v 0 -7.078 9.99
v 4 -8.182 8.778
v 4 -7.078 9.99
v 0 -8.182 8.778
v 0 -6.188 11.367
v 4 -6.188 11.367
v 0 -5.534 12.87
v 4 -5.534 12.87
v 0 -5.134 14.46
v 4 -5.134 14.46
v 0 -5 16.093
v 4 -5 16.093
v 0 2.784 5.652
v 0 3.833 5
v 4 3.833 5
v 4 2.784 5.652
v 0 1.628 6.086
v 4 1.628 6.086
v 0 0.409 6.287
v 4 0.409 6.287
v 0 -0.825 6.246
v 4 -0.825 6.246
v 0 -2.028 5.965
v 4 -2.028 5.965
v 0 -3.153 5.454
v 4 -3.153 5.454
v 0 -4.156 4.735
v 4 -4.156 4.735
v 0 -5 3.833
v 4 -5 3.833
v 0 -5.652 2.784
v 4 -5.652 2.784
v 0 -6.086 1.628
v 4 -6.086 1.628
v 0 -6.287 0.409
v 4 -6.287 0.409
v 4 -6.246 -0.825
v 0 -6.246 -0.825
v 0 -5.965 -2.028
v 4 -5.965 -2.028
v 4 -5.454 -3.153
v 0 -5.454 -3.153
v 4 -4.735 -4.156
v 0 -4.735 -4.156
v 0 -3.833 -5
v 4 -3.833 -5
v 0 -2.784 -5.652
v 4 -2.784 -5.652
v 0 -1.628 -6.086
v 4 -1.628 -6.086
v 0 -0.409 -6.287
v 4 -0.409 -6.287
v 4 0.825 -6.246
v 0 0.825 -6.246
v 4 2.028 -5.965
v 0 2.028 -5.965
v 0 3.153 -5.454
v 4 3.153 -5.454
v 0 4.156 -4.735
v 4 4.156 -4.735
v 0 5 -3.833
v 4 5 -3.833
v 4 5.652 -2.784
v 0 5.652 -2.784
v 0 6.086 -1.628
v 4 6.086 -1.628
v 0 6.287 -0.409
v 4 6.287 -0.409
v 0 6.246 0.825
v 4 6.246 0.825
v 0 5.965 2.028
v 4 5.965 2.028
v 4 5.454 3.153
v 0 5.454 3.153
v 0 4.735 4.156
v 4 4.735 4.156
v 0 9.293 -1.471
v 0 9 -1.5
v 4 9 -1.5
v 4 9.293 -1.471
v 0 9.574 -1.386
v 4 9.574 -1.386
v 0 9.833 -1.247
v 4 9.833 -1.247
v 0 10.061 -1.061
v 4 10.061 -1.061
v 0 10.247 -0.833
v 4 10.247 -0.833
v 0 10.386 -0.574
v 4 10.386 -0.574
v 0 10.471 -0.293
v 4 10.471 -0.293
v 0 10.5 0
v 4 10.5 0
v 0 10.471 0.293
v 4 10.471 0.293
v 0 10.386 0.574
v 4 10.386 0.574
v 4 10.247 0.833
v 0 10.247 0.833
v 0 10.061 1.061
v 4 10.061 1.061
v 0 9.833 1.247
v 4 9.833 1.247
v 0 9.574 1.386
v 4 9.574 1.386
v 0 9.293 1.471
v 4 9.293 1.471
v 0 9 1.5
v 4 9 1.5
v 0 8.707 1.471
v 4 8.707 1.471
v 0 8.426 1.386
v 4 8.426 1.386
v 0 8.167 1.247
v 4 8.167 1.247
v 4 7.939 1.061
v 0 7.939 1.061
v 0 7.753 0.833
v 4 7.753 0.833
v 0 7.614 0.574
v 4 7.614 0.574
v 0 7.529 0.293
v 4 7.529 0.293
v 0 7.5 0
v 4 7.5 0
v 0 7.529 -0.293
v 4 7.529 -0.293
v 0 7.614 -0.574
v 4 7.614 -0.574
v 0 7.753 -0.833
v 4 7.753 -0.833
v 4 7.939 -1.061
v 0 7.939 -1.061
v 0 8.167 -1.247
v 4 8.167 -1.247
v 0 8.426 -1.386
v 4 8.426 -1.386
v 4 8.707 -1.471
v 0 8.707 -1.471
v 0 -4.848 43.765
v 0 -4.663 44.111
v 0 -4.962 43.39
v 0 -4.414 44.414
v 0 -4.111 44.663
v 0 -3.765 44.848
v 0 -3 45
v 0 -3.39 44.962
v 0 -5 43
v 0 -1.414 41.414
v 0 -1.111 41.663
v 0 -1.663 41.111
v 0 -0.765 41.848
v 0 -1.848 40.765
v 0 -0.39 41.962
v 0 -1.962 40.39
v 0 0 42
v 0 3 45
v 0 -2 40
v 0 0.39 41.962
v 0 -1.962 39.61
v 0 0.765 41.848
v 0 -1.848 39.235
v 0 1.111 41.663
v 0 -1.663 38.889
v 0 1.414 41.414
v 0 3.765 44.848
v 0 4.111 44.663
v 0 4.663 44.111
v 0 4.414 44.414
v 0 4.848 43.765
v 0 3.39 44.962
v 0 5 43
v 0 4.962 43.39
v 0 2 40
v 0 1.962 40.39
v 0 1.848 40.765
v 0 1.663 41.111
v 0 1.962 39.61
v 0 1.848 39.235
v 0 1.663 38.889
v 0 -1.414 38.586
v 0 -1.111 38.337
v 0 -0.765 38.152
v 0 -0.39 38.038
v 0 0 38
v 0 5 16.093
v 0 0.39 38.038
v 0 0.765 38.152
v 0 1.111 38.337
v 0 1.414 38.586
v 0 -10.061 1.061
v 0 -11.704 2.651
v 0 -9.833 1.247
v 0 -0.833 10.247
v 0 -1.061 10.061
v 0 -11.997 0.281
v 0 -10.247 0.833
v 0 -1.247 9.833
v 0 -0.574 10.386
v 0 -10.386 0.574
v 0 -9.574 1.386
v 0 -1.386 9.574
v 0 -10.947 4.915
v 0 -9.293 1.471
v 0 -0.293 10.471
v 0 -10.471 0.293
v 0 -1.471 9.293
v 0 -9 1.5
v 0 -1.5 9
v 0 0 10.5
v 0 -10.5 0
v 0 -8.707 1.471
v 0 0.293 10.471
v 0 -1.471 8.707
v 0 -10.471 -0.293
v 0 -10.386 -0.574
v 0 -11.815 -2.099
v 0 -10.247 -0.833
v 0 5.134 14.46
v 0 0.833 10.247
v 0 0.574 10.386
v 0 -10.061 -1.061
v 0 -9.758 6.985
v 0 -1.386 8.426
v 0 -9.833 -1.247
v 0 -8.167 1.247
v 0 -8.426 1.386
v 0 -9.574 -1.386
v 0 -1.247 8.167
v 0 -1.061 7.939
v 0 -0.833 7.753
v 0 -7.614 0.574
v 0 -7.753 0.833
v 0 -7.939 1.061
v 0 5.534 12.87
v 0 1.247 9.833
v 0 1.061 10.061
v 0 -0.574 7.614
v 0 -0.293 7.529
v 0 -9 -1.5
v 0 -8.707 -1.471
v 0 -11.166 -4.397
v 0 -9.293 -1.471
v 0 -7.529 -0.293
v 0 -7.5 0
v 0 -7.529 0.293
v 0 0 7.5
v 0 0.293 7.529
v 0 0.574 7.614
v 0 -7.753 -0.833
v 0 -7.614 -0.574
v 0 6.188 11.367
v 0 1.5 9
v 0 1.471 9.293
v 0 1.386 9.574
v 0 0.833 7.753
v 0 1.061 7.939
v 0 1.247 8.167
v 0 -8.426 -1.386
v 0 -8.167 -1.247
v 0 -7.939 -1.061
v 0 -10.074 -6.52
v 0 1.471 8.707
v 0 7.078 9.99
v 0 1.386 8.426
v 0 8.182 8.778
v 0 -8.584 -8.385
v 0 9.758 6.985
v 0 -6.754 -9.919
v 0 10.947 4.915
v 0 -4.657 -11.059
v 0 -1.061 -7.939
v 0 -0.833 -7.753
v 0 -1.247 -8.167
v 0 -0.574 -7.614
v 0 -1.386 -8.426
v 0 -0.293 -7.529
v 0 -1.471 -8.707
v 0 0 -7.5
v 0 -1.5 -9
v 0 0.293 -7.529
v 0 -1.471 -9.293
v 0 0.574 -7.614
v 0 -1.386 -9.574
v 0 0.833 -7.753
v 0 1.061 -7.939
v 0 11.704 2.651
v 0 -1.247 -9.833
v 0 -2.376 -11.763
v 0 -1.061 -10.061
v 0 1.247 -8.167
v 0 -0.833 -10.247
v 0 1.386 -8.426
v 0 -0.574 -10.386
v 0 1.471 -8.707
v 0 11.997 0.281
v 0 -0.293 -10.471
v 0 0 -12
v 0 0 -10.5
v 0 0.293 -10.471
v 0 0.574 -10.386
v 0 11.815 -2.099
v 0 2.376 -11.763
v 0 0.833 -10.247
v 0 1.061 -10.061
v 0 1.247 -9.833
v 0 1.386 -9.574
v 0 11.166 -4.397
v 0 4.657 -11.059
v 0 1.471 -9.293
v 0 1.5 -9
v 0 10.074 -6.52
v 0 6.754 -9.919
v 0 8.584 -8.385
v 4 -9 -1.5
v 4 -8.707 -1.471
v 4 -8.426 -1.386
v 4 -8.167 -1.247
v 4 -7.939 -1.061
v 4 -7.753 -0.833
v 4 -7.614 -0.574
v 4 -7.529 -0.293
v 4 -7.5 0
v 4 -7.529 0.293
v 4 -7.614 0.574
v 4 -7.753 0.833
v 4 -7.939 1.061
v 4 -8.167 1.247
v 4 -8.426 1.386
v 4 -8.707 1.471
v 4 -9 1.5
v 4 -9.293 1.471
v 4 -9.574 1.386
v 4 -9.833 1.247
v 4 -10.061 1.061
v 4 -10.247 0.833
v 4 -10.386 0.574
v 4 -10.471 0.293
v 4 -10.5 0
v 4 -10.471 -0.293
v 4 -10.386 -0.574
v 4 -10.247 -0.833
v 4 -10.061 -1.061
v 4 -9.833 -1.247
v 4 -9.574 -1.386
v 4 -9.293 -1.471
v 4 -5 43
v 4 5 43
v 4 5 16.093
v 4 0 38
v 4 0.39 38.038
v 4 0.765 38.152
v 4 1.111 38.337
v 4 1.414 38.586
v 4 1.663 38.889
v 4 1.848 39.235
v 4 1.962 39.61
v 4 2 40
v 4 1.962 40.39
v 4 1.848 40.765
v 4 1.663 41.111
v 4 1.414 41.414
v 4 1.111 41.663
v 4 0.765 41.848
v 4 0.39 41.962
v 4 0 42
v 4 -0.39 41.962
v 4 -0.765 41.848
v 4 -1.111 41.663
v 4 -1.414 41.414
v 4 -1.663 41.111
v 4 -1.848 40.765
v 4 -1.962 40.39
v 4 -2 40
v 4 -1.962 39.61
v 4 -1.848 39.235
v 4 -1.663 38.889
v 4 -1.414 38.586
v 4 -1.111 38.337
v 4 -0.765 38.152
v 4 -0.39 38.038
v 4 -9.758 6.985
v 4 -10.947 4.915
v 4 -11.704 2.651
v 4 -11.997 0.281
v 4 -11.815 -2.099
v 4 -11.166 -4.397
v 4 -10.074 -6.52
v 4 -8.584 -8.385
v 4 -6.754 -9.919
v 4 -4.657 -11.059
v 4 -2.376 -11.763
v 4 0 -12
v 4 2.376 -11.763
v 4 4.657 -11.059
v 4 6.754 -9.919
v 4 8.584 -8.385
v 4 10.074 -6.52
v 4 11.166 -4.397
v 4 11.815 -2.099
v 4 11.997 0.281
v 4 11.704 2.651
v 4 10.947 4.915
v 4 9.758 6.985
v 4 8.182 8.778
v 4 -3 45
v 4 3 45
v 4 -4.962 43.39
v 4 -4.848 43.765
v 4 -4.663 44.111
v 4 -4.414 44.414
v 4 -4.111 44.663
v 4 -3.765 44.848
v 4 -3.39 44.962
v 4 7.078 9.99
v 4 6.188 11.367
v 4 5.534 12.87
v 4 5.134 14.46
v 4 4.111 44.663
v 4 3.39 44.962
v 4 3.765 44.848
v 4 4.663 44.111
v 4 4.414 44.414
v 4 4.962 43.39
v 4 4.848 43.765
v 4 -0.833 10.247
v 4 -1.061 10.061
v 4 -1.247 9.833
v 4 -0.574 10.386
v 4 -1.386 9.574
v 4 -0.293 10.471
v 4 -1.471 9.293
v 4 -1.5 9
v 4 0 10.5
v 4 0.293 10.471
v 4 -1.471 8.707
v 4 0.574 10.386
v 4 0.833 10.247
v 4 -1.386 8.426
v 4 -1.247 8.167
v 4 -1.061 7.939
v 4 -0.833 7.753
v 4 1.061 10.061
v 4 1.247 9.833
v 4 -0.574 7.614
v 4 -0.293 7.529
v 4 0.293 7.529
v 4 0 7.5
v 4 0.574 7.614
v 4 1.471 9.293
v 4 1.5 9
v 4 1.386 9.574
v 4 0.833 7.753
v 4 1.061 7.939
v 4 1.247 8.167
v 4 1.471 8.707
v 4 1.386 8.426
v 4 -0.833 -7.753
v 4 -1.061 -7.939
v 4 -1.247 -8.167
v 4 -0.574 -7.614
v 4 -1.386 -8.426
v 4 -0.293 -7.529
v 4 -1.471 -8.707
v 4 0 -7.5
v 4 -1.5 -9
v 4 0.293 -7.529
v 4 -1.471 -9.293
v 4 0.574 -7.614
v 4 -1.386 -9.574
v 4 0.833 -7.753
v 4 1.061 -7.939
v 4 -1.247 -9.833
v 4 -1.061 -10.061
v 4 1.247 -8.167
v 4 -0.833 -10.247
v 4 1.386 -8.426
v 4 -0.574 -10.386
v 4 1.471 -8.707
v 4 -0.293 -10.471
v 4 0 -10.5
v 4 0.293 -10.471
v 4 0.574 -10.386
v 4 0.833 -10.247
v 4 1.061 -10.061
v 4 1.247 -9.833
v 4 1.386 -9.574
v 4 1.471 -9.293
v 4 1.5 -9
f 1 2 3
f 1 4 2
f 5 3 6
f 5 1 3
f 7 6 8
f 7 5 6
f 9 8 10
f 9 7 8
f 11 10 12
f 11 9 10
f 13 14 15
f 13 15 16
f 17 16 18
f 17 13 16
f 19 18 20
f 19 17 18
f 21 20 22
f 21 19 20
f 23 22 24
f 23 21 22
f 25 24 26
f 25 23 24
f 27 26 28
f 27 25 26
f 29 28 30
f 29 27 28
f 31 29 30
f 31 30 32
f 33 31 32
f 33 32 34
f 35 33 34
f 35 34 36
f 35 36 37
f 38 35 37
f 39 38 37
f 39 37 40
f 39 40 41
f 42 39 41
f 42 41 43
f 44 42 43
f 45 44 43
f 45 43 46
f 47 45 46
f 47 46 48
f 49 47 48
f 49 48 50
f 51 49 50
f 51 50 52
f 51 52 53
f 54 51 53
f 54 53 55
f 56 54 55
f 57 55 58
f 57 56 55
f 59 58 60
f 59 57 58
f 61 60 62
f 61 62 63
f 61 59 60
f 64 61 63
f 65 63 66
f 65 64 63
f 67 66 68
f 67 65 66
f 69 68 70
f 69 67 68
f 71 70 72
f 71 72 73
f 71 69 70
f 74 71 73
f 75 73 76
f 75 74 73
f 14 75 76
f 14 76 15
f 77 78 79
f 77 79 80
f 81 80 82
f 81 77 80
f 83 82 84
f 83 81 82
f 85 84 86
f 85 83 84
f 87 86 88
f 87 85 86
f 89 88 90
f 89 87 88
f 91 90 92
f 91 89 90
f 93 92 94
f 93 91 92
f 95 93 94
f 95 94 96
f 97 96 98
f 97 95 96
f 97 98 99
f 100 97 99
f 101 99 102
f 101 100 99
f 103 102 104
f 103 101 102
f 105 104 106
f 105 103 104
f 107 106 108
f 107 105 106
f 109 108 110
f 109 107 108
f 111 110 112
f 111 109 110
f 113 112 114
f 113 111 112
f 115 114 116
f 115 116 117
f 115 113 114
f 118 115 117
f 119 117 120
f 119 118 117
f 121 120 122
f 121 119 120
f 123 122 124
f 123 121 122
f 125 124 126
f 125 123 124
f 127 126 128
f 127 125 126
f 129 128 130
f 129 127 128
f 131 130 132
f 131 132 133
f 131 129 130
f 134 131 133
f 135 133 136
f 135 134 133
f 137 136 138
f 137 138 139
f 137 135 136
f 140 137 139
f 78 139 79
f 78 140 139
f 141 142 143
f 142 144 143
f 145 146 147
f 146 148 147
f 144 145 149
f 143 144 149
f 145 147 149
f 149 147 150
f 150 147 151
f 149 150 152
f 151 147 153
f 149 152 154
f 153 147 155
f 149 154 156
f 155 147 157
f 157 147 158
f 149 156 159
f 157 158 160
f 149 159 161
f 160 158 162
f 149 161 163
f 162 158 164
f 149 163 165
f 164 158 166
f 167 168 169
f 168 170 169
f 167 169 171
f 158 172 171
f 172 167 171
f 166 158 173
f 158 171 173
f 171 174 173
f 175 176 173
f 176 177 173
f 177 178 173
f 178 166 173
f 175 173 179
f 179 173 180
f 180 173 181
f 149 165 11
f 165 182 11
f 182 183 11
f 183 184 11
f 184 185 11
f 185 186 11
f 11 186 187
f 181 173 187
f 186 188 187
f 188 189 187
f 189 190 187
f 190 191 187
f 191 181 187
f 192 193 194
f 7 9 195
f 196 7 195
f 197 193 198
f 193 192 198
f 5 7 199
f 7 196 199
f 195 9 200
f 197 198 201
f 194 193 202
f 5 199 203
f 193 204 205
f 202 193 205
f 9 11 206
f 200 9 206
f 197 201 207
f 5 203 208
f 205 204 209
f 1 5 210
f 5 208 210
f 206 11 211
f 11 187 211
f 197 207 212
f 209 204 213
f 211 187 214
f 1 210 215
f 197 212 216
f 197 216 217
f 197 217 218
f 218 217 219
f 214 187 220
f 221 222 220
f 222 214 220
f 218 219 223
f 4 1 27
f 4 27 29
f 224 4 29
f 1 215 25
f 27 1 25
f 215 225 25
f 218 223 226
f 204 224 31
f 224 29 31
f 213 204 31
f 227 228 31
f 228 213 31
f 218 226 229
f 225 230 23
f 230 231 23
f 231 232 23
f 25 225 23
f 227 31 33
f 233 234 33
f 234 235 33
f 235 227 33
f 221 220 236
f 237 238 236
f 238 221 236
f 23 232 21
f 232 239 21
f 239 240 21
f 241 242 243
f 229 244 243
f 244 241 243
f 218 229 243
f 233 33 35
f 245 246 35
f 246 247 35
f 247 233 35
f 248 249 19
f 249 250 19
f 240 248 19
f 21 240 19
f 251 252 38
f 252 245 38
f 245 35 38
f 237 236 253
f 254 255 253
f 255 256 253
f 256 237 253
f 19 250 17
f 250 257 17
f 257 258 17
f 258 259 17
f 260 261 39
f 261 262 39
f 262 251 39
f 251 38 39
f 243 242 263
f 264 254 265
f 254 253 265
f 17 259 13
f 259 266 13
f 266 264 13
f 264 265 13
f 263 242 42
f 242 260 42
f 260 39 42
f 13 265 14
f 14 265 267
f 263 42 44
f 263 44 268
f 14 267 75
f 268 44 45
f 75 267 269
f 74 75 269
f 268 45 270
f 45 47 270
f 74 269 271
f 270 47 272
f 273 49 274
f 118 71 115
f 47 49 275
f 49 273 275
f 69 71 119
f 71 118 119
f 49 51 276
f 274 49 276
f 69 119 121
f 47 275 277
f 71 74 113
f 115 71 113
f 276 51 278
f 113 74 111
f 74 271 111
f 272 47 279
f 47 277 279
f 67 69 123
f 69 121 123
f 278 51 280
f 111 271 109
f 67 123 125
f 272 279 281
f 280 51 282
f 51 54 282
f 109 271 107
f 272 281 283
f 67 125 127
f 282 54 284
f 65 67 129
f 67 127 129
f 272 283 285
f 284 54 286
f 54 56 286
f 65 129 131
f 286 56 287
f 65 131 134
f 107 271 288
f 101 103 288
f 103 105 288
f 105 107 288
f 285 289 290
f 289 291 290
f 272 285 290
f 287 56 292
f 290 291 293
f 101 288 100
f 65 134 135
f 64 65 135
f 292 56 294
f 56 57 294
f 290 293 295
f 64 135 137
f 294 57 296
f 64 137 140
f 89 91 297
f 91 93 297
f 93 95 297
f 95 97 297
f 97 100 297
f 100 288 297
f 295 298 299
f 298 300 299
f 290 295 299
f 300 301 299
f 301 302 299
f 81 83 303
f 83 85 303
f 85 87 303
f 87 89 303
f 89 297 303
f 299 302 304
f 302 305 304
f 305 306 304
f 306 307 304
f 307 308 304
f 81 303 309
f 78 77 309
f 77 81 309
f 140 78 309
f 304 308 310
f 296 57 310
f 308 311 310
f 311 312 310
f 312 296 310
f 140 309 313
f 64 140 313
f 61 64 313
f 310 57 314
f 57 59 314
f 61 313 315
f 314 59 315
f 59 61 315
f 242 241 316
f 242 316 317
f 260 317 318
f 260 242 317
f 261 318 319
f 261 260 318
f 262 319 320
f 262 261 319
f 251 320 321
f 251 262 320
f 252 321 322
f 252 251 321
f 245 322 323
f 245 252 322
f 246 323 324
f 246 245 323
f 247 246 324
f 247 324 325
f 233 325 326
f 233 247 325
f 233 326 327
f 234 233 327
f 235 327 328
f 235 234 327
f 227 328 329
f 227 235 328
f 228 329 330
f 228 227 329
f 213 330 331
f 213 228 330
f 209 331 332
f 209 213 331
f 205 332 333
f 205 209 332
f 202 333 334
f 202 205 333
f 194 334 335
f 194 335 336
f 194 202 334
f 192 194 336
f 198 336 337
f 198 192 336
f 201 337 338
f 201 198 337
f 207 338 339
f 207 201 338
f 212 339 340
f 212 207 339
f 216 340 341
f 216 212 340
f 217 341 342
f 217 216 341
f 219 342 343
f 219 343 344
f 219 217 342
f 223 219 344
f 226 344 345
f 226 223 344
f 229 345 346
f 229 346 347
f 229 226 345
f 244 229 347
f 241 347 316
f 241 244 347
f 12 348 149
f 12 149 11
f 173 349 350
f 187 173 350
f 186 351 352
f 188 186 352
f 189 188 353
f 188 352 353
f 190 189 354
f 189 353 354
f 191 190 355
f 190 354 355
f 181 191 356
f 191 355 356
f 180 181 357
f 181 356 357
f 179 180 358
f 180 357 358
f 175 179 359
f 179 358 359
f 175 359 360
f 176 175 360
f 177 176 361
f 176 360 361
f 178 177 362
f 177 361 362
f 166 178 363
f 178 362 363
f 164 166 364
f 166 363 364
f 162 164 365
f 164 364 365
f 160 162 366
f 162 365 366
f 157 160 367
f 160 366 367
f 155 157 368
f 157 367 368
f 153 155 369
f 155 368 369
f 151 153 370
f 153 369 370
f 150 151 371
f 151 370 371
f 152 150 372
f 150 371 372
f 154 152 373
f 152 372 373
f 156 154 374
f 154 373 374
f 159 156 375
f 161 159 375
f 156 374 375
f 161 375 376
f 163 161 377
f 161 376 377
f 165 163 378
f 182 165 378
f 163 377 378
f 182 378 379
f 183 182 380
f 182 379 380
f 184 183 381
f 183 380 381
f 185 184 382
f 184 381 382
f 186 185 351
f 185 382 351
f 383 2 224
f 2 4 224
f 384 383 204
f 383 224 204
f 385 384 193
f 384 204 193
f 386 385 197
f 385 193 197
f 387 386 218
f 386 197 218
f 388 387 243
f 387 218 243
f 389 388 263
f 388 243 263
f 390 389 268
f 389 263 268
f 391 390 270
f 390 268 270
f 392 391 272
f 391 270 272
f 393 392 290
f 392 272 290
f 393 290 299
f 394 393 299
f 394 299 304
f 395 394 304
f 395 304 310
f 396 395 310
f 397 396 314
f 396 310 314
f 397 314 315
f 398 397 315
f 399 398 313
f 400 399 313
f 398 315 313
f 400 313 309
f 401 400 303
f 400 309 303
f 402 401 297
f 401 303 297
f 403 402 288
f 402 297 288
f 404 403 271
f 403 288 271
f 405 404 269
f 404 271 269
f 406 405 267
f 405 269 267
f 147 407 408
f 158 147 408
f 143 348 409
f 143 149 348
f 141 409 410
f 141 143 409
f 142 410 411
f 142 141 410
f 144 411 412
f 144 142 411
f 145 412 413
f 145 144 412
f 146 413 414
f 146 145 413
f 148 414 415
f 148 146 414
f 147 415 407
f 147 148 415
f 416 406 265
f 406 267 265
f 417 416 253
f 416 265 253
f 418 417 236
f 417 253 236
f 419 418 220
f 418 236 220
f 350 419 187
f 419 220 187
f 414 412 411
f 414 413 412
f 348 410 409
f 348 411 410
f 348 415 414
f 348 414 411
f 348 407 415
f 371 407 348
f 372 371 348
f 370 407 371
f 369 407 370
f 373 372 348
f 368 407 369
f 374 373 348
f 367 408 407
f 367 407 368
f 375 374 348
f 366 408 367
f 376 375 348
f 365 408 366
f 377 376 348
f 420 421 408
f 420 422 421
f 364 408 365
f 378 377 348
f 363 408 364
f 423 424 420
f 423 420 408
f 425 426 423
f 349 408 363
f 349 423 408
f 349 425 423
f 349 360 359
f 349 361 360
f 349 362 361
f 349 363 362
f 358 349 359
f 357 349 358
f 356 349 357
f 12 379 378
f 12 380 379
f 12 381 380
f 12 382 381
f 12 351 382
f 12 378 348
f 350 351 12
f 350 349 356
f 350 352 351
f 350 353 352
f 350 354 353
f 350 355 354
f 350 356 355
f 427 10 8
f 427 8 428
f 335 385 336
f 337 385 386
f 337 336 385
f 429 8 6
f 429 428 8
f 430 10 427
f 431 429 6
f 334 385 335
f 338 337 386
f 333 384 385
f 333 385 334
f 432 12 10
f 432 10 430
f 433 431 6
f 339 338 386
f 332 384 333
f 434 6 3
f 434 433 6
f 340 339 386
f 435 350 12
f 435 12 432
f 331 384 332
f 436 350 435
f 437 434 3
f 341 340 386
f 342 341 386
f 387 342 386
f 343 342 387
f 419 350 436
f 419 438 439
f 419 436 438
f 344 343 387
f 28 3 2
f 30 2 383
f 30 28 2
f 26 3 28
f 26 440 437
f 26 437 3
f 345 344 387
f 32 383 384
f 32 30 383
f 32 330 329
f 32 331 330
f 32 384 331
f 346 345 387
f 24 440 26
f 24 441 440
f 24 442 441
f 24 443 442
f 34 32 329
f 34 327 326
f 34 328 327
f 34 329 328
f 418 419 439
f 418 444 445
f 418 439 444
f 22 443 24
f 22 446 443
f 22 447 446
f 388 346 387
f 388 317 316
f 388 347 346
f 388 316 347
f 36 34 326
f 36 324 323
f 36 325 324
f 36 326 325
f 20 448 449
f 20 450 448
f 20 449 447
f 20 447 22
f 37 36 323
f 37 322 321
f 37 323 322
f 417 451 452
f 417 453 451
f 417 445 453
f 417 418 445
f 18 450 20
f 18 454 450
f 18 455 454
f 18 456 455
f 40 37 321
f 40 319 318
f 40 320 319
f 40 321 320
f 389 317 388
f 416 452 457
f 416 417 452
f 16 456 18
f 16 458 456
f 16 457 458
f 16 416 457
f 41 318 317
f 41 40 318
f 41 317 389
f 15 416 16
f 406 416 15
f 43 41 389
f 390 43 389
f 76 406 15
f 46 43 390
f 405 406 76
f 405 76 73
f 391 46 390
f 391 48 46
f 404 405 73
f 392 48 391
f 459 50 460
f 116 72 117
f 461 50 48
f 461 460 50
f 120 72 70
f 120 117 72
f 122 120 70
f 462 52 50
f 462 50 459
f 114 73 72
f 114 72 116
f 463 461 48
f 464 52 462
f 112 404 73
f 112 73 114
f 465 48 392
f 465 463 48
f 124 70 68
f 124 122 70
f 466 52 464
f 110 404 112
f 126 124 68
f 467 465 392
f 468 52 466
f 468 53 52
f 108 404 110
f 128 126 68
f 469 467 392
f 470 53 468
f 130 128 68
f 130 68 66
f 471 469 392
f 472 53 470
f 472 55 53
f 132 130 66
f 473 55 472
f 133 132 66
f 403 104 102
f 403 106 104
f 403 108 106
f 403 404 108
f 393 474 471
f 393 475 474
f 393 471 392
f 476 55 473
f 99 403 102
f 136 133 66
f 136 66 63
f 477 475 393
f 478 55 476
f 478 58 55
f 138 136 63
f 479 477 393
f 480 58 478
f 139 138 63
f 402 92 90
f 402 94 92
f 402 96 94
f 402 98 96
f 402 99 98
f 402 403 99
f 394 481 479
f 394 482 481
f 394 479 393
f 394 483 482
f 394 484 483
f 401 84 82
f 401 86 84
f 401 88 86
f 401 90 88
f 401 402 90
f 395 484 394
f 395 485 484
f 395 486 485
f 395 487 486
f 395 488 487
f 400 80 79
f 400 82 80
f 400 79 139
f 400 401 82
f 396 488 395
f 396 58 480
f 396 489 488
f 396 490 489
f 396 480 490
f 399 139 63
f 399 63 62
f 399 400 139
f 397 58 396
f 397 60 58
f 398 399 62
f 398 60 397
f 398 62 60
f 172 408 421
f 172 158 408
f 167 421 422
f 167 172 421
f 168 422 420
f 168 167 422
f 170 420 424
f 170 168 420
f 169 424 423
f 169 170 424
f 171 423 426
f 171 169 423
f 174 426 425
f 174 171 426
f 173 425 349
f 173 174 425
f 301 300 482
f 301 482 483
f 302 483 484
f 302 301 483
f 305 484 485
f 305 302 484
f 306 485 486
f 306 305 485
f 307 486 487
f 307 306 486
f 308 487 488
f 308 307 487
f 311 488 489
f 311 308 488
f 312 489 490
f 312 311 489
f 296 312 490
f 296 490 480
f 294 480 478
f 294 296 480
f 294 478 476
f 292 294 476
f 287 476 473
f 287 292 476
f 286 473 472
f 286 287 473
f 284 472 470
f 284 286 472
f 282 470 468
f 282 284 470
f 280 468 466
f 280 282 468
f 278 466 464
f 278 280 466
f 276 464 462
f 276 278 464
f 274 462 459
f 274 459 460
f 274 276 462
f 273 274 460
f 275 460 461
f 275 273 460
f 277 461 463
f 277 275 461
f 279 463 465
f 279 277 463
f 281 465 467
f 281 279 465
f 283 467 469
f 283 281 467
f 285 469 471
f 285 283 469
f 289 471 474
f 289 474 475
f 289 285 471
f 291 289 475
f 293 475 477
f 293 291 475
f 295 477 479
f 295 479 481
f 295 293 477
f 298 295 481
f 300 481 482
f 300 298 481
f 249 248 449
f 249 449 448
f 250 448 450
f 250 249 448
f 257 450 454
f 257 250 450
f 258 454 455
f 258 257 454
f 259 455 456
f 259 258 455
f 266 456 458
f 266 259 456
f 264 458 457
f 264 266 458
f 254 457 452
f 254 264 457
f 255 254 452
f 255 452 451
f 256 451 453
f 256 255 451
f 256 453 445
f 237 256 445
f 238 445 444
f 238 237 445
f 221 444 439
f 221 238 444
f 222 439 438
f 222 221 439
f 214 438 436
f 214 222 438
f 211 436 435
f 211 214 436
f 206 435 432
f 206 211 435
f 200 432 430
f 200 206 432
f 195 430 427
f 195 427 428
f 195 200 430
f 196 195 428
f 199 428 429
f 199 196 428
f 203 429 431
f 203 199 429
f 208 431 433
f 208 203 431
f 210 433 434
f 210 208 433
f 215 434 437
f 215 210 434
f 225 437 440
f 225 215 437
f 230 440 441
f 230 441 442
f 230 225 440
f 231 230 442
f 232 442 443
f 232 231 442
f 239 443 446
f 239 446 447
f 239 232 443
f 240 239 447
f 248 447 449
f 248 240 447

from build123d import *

# Parameters (mm, degrees)
SKETCH_1_R          = 12
SKETCH_1_R_2        = 1.5
SKETCH_1_R_3        = 6.3
EXTRUDE_1_DEPTH     = 4
SKETCH_6_W          = 40
SKETCH_6_H          = 10
SKETCH_6_R          = 2
SKETCH_6_R_2        = 1.5
EXTRUDE_5_DEPTH     = 4
FILLET_1_R          = 10
FILLET_2_R          = 2
SKETCH_7_R          = 6.3
CUT_EXTRUDE_1_DEPTH = 5


with BuildPart() as part:
    # 草图1 → 凸台-拉伸1 (new body)
    with BuildSketch(Plane(origin=(0, 0, 0), x_dir=(0, 0, -1), z_dir=(1, 0, 0))):
        Circle(SKETCH_1_R)
        with Locations((0, 9)):
            Circle(SKETCH_1_R_2, mode=Mode.SUBTRACT)
        Circle(SKETCH_1_R_3, mode=Mode.SUBTRACT)
        with Locations((9, 0)):
            Circle(SKETCH_1_R_2, mode=Mode.SUBTRACT)
        with Locations((0, -9)):
            Circle(SKETCH_1_R_2, mode=Mode.SUBTRACT)
        with Locations((-9, 0)):
            Circle(SKETCH_1_R_2, mode=Mode.SUBTRACT)
    extrude(amount=EXTRUDE_1_DEPTH)

    # 草图6 → 凸台-拉伸5 (add)
    with BuildSketch(Plane(origin=(4, 0, 0), x_dir=(0, 0, -1), z_dir=(1, 0, 0))):
        with Locations((-25, 0)):
            Rectangle(SKETCH_6_W, SKETCH_6_H)
        with Locations((-40, 0)):
            Circle(SKETCH_6_R, mode=Mode.SUBTRACT)
        with Locations((-9, 0)):
            Circle(SKETCH_6_R_2, mode=Mode.SUBTRACT)
    extrude(amount=-EXTRUDE_5_DEPTH)

    # 圆角1
    fillet_1_edges = [part.edges().sort_by_distance(p)[0] for p in [
        (2, 5, 10.908712115),
        (2, -5, 10.908712115),
    ]]
    fillet(fillet_1_edges, radius=FILLET_1_R)

    # 圆角2
    fillet_2_edges = [part.edges().sort_by_distance(p)[0] for p in [
        (2, 5, 45),
        (2, -5, 45),
    ]]
    fillet(fillet_2_edges, radius=FILLET_2_R)

    # 草图7 → 切除-拉伸1 (cut, symmetric)
    with BuildSketch(Plane(origin=(4, 0, 0), x_dir=(0, 0, -1), z_dir=(1, 0, 0))):
        Circle(SKETCH_7_R)
    extrude(amount=CUT_EXTRUDE_1_DEPTH, both=True, mode=Mode.SUBTRACT)


solid = part.part
